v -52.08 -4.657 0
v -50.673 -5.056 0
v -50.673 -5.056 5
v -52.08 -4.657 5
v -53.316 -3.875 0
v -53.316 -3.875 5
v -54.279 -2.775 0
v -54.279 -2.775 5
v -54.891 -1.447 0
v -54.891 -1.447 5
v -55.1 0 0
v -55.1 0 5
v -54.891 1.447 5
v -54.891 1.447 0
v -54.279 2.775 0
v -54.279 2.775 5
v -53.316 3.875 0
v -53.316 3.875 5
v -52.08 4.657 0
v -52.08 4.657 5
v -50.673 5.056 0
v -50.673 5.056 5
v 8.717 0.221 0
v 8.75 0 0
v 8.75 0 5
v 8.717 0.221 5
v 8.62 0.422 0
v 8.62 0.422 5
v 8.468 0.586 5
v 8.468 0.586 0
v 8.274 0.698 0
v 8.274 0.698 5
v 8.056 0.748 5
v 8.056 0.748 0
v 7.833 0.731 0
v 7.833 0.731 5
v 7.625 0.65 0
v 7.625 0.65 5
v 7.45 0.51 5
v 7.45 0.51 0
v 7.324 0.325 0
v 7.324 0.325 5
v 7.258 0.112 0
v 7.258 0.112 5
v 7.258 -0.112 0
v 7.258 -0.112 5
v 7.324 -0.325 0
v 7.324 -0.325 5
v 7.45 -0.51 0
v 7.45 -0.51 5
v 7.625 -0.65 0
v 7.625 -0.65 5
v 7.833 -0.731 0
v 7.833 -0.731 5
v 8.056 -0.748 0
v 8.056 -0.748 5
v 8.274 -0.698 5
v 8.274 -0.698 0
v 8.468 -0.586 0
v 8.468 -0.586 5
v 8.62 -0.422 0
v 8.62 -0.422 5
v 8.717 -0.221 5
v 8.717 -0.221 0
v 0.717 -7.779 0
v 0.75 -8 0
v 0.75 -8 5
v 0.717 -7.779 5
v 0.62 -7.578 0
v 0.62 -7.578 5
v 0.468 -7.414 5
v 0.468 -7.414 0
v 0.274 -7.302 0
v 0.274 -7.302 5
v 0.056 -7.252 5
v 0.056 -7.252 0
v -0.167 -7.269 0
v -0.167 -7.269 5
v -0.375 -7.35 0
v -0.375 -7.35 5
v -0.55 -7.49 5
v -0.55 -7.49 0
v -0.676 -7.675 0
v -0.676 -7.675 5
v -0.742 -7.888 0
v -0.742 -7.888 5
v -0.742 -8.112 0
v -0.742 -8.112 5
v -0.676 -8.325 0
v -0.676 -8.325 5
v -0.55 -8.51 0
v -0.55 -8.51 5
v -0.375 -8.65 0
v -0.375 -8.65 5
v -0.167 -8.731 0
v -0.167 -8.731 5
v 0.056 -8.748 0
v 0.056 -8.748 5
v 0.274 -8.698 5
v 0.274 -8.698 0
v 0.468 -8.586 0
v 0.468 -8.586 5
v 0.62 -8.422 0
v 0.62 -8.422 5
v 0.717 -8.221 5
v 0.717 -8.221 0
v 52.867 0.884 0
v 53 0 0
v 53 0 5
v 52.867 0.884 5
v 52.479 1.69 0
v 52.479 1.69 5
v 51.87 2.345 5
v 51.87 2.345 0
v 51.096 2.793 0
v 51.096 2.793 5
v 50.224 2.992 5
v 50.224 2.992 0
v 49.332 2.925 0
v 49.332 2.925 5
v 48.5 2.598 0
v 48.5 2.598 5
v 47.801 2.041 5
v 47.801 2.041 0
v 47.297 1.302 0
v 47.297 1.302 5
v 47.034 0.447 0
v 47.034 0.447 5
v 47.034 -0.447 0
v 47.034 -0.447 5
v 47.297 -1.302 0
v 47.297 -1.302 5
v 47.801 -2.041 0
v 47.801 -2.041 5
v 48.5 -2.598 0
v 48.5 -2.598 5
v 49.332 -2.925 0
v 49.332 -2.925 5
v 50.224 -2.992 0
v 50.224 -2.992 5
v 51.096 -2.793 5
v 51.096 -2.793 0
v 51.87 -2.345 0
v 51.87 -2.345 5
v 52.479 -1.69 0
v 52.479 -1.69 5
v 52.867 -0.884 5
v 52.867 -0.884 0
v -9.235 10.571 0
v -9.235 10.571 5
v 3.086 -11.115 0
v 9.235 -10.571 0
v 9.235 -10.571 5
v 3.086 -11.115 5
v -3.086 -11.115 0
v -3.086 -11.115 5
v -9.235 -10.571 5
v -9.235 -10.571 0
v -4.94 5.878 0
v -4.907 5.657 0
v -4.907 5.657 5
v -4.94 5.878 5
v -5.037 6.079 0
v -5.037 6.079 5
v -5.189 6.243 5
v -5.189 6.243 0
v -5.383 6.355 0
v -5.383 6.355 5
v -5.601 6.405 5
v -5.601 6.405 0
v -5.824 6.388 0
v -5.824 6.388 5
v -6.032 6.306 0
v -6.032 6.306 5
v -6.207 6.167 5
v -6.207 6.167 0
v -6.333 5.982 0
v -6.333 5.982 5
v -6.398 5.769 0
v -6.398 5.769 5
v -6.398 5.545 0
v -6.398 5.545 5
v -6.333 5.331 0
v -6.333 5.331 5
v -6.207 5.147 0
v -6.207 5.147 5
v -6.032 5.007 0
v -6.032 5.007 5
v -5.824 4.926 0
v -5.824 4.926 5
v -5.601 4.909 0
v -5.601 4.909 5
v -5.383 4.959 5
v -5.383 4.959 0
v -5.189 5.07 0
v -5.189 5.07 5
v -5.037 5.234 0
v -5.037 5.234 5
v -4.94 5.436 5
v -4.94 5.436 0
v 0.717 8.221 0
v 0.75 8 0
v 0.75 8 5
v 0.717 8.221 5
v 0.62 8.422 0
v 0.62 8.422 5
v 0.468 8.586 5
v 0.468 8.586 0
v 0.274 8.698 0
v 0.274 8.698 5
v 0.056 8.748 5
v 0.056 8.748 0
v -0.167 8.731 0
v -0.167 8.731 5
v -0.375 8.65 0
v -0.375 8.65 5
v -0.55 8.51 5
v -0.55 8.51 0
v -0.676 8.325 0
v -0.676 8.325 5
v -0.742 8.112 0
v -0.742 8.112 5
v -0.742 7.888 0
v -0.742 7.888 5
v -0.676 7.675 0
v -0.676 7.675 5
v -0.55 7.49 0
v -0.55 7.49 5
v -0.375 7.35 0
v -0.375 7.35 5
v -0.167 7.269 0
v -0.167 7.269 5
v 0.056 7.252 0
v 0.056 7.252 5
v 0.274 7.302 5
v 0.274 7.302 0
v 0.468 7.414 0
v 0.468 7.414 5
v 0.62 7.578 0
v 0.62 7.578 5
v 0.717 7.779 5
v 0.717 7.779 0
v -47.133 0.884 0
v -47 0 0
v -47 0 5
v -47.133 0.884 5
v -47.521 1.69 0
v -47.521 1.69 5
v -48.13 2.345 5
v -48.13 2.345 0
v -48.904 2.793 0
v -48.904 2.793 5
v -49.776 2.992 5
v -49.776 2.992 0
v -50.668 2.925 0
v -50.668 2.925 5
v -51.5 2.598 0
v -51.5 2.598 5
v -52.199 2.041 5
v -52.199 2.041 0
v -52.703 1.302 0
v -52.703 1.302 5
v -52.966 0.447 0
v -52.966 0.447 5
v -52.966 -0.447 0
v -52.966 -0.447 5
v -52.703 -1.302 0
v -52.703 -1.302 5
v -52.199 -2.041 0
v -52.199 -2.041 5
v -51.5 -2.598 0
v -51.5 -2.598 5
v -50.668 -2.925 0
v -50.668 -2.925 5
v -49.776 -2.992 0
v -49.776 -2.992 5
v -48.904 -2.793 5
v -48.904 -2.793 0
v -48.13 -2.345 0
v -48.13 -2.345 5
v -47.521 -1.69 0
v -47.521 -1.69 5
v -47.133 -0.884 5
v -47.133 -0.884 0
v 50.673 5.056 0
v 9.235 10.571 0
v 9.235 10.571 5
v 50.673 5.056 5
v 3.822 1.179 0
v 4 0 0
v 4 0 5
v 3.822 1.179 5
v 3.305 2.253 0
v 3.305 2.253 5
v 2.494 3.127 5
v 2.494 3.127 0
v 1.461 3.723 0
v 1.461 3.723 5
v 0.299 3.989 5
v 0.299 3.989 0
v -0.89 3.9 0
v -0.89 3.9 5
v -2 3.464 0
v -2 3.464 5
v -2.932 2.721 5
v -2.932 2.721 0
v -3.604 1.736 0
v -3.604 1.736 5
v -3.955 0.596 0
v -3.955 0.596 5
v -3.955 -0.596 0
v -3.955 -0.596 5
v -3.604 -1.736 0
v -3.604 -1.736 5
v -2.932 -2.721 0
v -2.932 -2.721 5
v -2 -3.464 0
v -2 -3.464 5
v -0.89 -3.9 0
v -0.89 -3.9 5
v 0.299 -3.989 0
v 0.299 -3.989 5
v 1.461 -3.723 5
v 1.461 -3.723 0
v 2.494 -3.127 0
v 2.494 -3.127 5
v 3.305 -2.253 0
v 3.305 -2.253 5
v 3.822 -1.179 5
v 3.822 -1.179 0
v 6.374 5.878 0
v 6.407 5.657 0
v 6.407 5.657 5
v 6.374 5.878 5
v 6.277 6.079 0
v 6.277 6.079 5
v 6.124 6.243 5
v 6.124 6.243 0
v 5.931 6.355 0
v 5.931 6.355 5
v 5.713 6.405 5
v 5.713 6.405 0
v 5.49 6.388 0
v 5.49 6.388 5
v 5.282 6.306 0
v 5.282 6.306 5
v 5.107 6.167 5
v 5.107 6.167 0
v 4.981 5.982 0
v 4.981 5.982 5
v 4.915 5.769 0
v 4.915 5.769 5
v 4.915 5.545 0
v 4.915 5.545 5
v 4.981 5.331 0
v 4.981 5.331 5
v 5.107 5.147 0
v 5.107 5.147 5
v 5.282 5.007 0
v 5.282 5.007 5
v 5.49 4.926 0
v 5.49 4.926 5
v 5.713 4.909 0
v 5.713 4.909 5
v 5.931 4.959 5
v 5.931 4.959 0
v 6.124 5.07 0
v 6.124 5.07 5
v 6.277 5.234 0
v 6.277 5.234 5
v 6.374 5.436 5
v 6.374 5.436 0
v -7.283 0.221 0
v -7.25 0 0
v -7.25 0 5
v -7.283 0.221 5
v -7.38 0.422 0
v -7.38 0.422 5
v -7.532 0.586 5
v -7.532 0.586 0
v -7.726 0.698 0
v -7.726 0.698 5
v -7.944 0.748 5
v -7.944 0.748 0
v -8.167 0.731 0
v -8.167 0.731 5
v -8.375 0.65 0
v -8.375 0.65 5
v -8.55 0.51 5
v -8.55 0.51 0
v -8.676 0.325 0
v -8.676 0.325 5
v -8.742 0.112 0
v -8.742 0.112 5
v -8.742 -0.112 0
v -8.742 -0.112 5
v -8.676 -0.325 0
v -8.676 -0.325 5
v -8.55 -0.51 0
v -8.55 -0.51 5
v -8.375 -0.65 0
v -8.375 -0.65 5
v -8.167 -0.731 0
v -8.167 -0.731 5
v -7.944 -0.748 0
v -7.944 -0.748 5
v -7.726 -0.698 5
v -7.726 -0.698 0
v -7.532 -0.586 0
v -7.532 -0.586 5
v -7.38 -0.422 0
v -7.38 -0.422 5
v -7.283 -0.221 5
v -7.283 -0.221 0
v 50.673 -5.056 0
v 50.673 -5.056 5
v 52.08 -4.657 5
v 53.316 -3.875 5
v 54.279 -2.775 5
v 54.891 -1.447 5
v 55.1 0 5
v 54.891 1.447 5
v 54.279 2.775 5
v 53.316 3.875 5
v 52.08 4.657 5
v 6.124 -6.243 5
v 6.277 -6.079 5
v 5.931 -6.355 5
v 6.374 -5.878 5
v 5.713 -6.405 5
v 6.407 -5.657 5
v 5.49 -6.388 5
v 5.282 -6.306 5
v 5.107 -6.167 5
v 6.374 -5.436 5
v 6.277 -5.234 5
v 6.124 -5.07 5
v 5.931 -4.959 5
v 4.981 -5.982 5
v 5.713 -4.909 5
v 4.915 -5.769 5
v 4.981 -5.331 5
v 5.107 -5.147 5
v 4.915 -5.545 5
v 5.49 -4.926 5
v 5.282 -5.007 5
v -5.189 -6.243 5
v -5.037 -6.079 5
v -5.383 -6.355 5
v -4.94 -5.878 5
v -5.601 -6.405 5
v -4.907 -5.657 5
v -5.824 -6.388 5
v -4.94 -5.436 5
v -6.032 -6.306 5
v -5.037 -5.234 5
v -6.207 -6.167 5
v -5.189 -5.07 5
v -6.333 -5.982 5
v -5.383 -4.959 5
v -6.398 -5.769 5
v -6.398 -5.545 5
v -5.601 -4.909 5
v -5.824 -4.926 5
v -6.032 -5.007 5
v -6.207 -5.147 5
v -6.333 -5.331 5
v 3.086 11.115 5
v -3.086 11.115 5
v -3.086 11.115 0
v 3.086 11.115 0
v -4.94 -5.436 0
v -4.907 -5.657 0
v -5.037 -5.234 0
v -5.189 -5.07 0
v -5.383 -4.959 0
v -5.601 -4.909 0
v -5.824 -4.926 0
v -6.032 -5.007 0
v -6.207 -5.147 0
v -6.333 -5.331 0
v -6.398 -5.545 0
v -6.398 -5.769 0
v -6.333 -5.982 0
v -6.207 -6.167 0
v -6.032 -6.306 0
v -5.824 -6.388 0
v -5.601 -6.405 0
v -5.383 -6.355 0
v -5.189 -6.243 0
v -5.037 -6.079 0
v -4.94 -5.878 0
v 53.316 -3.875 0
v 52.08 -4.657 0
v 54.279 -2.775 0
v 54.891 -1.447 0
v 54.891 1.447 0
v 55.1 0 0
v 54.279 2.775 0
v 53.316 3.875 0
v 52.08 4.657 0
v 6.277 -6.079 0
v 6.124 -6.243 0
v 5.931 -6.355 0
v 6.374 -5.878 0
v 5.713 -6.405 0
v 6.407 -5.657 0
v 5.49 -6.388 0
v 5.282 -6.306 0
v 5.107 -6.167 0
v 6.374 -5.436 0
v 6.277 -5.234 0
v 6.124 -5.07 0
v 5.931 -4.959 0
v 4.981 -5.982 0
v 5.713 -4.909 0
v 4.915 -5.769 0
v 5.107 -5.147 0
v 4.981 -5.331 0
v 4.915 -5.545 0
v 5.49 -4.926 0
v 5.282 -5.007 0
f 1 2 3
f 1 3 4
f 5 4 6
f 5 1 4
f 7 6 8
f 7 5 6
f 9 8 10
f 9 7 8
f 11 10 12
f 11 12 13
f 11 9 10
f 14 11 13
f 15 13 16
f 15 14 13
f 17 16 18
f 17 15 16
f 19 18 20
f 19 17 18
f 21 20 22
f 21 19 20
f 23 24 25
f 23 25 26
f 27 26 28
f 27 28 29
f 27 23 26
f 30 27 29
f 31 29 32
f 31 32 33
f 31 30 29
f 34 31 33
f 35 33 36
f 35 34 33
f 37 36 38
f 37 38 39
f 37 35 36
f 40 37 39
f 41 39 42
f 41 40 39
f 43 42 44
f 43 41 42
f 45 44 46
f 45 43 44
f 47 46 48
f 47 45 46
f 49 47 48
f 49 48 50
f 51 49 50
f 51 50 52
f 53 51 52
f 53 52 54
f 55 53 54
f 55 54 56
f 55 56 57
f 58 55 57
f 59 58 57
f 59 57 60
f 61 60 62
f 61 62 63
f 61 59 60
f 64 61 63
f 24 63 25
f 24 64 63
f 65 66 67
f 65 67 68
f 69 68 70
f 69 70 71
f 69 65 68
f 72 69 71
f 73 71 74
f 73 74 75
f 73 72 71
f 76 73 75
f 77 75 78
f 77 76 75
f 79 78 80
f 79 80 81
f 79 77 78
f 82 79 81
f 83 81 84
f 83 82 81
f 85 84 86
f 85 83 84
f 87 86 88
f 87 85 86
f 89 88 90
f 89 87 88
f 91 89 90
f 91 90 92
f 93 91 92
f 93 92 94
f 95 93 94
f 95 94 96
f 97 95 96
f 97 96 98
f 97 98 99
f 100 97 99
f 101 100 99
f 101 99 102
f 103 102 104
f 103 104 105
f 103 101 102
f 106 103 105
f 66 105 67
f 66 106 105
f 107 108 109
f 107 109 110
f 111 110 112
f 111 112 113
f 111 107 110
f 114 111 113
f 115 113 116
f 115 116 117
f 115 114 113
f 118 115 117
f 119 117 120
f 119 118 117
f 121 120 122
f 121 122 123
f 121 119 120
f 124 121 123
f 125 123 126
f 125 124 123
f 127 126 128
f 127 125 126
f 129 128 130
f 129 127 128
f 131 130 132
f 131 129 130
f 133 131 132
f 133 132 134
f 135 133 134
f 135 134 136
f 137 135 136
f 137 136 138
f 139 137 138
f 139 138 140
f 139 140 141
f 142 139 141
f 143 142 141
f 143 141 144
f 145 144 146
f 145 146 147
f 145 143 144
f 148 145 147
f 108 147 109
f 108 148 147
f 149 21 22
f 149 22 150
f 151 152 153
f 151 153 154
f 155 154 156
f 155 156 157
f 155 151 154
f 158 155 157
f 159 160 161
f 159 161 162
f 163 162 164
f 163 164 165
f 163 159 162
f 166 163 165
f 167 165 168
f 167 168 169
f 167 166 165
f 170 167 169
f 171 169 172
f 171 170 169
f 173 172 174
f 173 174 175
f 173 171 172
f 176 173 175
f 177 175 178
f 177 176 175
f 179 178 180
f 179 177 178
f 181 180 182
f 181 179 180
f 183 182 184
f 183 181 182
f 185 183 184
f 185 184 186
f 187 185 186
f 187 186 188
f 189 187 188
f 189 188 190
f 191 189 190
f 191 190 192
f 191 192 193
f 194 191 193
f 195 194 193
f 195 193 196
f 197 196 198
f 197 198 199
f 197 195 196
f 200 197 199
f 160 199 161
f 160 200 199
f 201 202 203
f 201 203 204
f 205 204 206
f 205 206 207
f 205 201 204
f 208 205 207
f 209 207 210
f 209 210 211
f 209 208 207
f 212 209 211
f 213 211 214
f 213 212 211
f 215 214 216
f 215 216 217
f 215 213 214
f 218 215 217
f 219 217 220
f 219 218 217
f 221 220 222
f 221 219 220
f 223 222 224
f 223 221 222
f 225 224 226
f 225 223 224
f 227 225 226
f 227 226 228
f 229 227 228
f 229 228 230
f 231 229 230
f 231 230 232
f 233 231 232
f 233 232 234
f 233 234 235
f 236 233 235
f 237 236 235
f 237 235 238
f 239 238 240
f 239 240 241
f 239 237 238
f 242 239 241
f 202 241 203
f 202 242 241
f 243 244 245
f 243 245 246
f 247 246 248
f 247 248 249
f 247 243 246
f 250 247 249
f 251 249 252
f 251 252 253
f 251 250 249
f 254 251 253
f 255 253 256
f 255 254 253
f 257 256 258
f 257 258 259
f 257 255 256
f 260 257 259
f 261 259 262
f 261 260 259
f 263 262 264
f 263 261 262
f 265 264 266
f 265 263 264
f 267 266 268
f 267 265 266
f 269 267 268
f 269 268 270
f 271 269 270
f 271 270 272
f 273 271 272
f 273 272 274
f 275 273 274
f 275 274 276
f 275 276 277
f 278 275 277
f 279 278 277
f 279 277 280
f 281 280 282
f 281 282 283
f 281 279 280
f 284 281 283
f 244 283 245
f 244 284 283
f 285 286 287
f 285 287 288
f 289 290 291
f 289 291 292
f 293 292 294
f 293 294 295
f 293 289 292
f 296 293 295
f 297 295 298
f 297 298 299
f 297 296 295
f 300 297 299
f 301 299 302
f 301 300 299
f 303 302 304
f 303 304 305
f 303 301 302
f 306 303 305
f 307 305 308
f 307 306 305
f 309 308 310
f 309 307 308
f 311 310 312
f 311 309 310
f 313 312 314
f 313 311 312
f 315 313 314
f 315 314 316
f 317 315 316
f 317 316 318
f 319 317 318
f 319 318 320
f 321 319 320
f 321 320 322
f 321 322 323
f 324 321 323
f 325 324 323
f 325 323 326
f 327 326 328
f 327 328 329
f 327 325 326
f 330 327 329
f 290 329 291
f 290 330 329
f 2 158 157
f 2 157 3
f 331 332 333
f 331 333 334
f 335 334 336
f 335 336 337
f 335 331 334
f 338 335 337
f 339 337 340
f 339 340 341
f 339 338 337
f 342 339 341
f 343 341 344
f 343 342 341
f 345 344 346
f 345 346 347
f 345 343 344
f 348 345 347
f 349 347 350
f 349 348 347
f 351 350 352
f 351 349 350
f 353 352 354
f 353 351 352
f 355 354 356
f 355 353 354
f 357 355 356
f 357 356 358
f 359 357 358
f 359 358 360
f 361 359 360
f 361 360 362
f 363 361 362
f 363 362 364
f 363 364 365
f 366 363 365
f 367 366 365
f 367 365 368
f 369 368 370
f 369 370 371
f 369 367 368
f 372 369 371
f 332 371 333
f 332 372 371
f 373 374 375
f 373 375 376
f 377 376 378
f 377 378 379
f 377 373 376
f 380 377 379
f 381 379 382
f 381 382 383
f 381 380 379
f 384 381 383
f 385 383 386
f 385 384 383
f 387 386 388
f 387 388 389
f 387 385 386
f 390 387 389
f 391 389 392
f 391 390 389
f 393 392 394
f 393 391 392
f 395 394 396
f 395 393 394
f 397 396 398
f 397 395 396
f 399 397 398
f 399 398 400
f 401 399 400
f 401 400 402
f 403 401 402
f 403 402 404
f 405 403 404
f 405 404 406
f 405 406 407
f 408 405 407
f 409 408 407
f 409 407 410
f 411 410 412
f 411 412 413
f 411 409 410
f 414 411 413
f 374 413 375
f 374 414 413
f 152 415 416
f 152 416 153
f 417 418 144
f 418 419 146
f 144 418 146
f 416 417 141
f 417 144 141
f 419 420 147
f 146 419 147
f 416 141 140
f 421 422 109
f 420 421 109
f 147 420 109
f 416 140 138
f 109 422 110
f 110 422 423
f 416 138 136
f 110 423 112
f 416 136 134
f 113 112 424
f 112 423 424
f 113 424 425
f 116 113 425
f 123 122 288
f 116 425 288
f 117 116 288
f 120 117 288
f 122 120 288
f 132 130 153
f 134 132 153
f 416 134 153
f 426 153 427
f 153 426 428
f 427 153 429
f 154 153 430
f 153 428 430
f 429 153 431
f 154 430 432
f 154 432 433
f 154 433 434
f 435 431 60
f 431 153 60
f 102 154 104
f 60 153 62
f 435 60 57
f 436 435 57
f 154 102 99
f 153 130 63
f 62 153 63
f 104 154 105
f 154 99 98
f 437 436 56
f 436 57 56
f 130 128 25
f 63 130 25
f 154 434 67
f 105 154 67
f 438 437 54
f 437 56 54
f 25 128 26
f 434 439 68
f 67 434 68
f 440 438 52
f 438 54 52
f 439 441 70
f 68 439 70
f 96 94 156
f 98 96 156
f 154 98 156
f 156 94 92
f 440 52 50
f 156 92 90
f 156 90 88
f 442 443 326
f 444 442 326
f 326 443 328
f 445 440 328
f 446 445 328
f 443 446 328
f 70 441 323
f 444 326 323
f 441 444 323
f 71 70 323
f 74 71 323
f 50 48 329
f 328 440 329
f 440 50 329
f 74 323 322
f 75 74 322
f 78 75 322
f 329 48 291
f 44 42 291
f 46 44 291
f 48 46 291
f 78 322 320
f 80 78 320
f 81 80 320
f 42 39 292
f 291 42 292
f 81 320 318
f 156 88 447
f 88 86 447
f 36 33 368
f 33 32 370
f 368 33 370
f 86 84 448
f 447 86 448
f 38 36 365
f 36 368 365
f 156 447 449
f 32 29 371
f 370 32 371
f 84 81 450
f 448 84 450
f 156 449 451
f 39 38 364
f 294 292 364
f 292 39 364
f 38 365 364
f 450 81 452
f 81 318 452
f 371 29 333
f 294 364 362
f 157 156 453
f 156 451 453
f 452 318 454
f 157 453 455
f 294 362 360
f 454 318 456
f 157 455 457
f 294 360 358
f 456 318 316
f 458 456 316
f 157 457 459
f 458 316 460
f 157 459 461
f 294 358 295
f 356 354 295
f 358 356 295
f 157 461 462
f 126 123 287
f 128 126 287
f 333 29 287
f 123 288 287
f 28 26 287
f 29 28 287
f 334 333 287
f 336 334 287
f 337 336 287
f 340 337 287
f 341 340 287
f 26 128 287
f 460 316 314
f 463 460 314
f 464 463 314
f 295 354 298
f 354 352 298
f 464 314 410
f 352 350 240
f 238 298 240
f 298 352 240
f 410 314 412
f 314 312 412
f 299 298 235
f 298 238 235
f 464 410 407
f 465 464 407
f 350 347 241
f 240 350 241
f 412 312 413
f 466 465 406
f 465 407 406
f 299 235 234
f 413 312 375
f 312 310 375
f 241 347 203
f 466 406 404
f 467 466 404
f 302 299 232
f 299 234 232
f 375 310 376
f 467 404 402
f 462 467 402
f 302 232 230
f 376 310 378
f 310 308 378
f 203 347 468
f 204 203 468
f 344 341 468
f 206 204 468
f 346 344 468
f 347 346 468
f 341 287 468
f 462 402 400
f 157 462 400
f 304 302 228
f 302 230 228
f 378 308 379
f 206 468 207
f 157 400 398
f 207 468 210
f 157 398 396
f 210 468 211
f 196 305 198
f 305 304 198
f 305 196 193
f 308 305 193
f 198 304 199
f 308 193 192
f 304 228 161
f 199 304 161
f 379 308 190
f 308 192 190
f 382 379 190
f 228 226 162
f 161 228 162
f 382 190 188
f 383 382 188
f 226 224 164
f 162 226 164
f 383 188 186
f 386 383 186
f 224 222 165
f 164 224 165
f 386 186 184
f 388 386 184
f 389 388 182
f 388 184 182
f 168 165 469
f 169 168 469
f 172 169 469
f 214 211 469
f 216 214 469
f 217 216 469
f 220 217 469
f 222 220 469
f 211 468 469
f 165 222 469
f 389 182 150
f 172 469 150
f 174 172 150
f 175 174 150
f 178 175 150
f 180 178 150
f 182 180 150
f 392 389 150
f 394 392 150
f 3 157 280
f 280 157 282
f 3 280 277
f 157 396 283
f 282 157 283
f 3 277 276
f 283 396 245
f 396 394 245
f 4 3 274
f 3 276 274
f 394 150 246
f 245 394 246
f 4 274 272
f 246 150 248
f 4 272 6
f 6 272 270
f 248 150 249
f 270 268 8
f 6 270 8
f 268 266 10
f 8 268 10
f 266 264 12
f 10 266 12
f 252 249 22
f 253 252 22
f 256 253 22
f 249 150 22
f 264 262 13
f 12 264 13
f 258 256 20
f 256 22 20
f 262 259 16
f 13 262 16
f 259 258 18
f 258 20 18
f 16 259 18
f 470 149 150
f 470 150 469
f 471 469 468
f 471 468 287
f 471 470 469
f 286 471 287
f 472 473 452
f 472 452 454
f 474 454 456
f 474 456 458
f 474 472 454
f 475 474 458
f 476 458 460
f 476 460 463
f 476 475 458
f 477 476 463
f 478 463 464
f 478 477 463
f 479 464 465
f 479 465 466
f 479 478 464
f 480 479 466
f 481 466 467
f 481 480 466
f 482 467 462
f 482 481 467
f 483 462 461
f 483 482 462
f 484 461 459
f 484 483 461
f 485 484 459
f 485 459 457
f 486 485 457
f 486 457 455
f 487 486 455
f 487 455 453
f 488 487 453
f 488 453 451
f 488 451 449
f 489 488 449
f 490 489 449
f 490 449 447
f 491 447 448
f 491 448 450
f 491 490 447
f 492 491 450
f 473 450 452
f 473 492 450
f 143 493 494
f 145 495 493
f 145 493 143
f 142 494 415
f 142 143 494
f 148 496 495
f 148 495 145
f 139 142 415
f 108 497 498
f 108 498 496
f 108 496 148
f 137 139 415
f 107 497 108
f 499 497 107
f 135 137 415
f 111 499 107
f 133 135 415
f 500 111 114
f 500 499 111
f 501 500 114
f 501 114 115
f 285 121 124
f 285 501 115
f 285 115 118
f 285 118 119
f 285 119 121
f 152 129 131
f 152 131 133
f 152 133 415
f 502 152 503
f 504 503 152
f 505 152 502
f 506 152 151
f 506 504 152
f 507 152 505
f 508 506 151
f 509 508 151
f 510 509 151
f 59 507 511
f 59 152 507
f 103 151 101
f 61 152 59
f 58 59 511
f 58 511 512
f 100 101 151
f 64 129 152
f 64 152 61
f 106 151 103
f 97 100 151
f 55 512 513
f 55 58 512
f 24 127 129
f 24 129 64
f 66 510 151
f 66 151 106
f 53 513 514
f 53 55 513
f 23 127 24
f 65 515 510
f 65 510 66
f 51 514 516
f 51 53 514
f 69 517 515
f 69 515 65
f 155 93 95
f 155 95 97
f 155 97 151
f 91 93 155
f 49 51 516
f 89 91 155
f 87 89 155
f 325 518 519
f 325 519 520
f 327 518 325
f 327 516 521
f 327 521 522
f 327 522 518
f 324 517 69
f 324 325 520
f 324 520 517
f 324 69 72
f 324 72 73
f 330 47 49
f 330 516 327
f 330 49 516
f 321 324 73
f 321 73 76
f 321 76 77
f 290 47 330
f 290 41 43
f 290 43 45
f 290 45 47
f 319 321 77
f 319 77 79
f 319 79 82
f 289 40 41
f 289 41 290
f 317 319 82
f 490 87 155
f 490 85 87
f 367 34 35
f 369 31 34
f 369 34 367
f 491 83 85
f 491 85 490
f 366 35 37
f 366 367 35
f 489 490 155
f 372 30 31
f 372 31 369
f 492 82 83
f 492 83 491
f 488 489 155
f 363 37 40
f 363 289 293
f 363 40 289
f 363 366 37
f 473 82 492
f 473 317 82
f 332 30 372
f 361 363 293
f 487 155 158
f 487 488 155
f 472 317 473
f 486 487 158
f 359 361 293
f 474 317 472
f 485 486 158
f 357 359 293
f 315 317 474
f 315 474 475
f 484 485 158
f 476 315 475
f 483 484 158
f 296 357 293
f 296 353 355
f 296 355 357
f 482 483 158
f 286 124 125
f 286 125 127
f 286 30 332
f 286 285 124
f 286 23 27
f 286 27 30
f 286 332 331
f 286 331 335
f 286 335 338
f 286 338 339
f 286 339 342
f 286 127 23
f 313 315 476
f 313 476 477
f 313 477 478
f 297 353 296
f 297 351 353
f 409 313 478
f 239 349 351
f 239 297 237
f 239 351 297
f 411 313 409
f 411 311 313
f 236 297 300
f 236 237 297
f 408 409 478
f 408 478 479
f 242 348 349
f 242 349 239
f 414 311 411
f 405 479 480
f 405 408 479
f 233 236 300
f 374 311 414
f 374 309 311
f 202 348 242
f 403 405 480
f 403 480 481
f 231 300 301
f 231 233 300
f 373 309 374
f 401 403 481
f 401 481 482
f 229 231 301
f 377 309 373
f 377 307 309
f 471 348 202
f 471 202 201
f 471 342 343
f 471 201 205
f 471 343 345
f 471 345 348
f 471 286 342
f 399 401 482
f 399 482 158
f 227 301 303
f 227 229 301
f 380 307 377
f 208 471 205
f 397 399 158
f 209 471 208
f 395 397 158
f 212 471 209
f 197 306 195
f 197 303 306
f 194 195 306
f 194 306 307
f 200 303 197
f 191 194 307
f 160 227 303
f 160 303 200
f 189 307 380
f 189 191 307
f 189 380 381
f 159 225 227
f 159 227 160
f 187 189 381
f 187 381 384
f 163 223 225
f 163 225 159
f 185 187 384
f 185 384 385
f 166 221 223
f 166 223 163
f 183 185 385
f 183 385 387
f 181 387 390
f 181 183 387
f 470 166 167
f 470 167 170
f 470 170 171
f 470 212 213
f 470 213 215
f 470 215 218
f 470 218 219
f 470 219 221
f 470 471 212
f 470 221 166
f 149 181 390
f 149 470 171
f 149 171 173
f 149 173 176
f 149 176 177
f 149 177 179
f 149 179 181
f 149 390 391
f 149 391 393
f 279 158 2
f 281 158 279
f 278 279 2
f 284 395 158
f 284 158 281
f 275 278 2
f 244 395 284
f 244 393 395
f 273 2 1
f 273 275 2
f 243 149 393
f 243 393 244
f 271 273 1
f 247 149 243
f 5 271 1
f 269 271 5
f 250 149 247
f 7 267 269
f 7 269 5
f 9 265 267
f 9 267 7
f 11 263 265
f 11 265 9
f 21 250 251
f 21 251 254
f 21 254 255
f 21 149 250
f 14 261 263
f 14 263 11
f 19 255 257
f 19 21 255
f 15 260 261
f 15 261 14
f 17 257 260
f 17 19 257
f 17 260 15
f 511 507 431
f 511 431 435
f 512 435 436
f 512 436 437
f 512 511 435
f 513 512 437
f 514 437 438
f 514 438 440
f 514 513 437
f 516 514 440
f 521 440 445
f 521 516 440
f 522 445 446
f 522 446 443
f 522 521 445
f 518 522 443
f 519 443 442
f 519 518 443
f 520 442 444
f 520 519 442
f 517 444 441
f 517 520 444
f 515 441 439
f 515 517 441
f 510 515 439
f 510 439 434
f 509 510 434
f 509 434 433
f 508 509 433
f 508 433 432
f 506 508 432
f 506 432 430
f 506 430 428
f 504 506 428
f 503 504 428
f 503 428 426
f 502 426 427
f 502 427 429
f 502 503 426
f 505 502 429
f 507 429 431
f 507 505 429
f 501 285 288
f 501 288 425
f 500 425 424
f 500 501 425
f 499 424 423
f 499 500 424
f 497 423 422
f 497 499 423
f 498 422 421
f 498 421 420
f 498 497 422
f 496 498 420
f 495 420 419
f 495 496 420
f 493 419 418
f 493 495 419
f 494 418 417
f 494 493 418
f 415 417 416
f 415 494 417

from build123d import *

# Parameters (mm, degrees)
SZKIC1_R                    = 4
SZKIC1_R_2                  = 0.75
SZKIC1_R_3                  = 3
DODANIE_WYCI_GNI_CIE1_DEPTH = 5


with BuildPart() as part:
    # Szkic1 → Dodanie-wyciągnięcie1 (new body)
    with BuildSketch(Plane.XY):
        with BuildLine():
            Line((-50.67287635, 5.055665151), (-9.235111676, 10.570763761))
            ThreePointArc((-9.235111676, 10.570763761), (0, 11.182632843), (9.235111676, 10.570763761))
            Line((9.235111676, 10.570763761), (50.67287635, 5.055665151))
            ThreePointArc((50.67287635, 5.055665151), (55.100246338, 0), (50.67287635, -5.055665151))
            Line((50.67287635, -5.055665151), (9.235111676, -10.570763761))
            ThreePointArc((9.235111676, -10.570763761), (0, -11.182632843), (-9.235111676, -10.570763761))
            Line((-9.235111676, -10.570763761), (-50.67287635, -5.055665151))
            ThreePointArc((-50.67287635, -5.055665151), (-55.100246338, 0), (-50.67287635, 5.055665151))
        make_face()
        Circle(SZKIC1_R, mode=Mode.SUBTRACT)
        with Locations((-5.656854249, 5.656854249)):
            Circle(SZKIC1_R_2, mode=Mode.SUBTRACT)
        with Locations((-8, 0)):
            Circle(SZKIC1_R_2, mode=Mode.SUBTRACT)
        with Locations((0, 8)):
            Circle(SZKIC1_R_2, mode=Mode.SUBTRACT)
        with Locations((5.656854249, 5.656854249)):
            Circle(SZKIC1_R_2, mode=Mode.SUBTRACT)
        with Locations((-50, 0)):
            Circle(SZKIC1_R_3, mode=Mode.SUBTRACT)
        with Locations((50, 0)):
            Circle(SZKIC1_R_3, mode=Mode.SUBTRACT)
        with Locations((8, 0)):
            Circle(SZKIC1_R_2, mode=Mode.SUBTRACT)
        with Locations((5.656854249, -5.656854249)):
            Circle(SZKIC1_R_2, mode=Mode.SUBTRACT)
        with Locations((0, -8)):
            Circle(SZKIC1_R_2, mode=Mode.SUBTRACT)
        with Locations((-5.656854249, -5.656854249)):
            Circle(SZKIC1_R_2, mode=Mode.SUBTRACT)
    extrude(amount=DODANIE_WYCI_GNI_CIE1_DEPTH)


solid = part.part
